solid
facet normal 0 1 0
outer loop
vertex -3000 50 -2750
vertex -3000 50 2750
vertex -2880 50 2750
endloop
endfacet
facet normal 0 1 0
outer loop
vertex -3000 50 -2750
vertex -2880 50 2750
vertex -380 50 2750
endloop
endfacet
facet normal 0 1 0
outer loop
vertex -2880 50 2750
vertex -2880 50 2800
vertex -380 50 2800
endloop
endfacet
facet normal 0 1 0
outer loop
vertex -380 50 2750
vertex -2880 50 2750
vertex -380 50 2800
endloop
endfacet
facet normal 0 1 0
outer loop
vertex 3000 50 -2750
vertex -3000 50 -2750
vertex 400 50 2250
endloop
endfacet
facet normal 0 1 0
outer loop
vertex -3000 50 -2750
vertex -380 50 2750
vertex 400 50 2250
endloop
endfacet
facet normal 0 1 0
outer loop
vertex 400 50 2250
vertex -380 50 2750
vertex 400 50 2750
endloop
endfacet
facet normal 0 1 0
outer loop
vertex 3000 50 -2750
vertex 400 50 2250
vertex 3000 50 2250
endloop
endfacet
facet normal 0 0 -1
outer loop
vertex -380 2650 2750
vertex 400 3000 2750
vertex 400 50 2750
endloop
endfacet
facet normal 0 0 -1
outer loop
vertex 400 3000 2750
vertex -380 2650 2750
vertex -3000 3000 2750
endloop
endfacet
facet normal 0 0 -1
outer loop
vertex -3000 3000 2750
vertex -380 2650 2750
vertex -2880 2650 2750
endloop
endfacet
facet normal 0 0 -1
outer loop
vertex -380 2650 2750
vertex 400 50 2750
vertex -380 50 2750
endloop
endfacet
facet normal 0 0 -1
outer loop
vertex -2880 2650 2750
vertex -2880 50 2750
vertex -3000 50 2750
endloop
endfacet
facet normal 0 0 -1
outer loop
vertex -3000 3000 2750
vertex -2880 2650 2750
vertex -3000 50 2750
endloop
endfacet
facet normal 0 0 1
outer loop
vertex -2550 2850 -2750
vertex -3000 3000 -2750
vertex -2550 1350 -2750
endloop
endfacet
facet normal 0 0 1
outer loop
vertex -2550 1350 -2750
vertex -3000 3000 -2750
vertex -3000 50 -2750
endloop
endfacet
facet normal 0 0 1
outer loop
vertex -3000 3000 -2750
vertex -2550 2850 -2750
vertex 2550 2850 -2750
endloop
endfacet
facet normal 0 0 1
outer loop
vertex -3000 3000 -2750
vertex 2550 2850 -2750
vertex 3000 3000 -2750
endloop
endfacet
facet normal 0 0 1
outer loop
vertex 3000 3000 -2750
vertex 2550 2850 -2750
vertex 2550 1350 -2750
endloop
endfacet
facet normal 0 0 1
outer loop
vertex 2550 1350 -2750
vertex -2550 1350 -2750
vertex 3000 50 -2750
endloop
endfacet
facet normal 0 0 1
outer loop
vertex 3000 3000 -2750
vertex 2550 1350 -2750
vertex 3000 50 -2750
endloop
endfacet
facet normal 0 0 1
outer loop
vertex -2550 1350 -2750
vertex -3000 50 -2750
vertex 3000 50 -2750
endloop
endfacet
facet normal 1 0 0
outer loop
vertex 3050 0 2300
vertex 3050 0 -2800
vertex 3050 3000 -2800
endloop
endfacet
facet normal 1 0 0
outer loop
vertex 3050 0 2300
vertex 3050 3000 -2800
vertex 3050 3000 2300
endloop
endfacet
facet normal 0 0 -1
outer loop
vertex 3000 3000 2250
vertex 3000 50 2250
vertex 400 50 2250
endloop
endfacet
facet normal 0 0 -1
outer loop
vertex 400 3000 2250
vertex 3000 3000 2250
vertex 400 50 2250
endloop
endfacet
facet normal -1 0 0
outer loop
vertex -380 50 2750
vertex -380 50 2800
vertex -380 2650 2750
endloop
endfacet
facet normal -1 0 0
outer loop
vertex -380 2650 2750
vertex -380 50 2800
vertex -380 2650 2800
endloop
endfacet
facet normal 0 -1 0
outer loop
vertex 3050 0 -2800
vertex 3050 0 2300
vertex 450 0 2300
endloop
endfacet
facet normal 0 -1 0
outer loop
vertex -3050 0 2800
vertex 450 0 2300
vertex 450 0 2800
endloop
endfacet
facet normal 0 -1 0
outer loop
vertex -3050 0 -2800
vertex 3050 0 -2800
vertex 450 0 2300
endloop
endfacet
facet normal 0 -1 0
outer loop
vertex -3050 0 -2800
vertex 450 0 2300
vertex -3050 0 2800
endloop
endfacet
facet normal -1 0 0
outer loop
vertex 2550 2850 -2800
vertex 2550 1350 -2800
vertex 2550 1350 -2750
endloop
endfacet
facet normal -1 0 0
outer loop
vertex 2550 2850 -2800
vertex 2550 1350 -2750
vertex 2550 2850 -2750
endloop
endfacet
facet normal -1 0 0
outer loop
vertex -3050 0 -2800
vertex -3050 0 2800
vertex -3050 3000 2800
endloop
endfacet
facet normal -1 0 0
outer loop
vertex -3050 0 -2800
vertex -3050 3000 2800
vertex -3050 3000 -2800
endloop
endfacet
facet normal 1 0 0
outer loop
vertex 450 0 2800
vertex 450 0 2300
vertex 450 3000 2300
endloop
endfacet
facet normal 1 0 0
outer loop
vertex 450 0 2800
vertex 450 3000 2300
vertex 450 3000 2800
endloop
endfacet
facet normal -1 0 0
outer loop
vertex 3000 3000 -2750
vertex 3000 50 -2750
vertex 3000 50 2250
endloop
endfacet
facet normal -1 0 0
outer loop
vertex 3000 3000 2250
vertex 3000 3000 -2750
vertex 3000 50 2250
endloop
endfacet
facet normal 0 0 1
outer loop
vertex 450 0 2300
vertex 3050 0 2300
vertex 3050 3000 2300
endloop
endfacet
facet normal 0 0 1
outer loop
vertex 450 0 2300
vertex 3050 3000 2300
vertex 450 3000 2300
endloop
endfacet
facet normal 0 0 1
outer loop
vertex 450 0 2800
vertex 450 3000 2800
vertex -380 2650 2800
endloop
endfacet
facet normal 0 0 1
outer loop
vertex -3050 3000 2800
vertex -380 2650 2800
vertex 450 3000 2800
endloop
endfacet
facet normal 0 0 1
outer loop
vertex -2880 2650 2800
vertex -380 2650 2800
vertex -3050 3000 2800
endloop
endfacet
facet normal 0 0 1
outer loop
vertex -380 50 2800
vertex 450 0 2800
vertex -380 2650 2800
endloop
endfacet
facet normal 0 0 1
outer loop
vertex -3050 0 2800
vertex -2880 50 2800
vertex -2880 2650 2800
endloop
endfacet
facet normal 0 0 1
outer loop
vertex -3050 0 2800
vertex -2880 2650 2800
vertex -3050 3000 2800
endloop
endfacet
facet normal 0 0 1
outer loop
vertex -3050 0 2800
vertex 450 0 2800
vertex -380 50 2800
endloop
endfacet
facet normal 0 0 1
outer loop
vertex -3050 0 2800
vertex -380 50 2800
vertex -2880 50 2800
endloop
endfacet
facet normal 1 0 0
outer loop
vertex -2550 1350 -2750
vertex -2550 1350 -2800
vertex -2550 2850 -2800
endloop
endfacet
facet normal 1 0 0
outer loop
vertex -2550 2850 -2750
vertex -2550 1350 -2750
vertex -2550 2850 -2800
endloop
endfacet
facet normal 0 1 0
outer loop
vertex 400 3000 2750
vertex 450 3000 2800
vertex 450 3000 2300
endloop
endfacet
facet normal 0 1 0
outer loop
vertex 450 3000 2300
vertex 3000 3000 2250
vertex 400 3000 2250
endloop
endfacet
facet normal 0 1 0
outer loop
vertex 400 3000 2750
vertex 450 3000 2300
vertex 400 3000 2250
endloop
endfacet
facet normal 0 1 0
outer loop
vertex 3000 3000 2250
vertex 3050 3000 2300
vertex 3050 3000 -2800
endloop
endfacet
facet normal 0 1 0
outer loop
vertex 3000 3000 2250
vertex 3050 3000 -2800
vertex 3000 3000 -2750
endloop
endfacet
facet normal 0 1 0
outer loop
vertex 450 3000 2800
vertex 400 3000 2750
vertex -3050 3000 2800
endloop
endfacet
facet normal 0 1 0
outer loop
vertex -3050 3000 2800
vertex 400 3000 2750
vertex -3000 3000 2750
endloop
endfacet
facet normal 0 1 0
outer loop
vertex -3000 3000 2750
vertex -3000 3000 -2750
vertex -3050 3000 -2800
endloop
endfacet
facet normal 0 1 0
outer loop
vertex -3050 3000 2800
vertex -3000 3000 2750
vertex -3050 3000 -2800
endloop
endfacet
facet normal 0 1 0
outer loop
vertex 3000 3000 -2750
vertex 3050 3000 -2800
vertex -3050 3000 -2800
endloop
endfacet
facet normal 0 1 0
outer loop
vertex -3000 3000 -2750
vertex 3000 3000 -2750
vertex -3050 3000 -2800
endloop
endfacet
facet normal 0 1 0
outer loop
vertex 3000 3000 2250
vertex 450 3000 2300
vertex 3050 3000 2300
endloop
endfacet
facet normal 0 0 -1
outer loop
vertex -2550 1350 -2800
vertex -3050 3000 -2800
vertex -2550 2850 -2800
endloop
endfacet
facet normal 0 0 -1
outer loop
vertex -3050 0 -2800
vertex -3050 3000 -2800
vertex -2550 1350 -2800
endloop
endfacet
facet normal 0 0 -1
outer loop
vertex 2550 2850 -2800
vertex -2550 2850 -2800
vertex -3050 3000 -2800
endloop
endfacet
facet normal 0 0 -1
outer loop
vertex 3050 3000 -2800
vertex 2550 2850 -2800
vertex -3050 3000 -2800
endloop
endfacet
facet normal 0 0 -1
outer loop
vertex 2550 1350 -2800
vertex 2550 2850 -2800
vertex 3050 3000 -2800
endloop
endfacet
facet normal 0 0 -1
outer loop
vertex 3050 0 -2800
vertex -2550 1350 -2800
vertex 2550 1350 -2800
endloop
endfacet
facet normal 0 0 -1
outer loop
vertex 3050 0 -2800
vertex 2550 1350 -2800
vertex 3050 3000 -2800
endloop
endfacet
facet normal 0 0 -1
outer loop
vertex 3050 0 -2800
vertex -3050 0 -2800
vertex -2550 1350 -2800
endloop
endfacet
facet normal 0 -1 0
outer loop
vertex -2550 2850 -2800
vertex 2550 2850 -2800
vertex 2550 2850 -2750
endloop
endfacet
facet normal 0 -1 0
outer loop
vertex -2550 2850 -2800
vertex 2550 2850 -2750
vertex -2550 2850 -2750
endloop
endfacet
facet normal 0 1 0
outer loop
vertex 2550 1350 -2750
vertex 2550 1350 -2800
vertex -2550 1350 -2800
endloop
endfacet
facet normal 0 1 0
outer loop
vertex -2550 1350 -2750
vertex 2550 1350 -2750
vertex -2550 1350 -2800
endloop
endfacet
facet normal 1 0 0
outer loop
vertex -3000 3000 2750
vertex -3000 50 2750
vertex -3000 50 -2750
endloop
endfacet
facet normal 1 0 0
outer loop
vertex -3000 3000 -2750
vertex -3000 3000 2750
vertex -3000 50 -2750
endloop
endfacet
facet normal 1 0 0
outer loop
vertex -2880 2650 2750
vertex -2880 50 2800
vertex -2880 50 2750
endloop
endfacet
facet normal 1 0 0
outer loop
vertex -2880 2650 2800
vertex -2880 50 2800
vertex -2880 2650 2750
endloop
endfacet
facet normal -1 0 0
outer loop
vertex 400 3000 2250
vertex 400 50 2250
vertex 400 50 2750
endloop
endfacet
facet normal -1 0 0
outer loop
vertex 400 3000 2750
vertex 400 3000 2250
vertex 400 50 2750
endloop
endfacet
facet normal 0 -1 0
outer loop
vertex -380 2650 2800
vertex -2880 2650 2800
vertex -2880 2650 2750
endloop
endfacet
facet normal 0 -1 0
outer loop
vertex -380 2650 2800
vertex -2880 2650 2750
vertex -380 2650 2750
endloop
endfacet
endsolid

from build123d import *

# Parameters (mm, degrees)
BOSS_EXTRUDE1_DEPTH = 3000
SHELL2_T            = -50
SKETCH2_W           = 2500
SKETCH2_H           = 2600
CUT_EXTRUDE1_DEPTH  = 3000
SKETCH3_W           = 5100
SKETCH3_H           = 1500
CUT_EXTRUDE2_DEPTH  = 3000


with BuildPart() as part:
    # Sketch1 → Boss-Extrude1 (new body)
    with BuildSketch(Plane(origin=(0, 0, 0), x_dir=(1, 0, 0), z_dir=(0, 1, 0))):
        Polygon((450, -2800), (-3050, -2800), (-3050, 2800), (3050, 2800), (3050, -2300), (450, -2300), align=None)
    extrude(amount=BOSS_EXTRUDE1_DEPTH)

    # Shell2
    shell2_openings = [part.faces().sort_by_distance(p)[0] for p in [
        (-69.233110164, 3000, -100.882531954),
    ]]
    offset(amount=SHELL2_T, openings=shell2_openings, kind=Kind.INTERSECTION)

    # Sketch2 → Cut-Extrude1 (cut)
    with BuildSketch(Plane.XY.offset(2800)):
        with Locations((-1630, 1350)):
            Rectangle(SKETCH2_W, SKETCH2_H)
    extrude(amount=-CUT_EXTRUDE1_DEPTH, mode=Mode.SUBTRACT)

    # Sketch3 → Cut-Extrude2 (cut)
    with BuildSketch(Plane(origin=(0, 0, -2800), x_dir=(-1, 0, 0), z_dir=(0, 0, -1))):
        with Locations((0, 2100)):
            Rectangle(SKETCH3_W, SKETCH3_H)
    extrude(amount=-CUT_EXTRUDE2_DEPTH, mode=Mode.SUBTRACT)


solid = part.part
